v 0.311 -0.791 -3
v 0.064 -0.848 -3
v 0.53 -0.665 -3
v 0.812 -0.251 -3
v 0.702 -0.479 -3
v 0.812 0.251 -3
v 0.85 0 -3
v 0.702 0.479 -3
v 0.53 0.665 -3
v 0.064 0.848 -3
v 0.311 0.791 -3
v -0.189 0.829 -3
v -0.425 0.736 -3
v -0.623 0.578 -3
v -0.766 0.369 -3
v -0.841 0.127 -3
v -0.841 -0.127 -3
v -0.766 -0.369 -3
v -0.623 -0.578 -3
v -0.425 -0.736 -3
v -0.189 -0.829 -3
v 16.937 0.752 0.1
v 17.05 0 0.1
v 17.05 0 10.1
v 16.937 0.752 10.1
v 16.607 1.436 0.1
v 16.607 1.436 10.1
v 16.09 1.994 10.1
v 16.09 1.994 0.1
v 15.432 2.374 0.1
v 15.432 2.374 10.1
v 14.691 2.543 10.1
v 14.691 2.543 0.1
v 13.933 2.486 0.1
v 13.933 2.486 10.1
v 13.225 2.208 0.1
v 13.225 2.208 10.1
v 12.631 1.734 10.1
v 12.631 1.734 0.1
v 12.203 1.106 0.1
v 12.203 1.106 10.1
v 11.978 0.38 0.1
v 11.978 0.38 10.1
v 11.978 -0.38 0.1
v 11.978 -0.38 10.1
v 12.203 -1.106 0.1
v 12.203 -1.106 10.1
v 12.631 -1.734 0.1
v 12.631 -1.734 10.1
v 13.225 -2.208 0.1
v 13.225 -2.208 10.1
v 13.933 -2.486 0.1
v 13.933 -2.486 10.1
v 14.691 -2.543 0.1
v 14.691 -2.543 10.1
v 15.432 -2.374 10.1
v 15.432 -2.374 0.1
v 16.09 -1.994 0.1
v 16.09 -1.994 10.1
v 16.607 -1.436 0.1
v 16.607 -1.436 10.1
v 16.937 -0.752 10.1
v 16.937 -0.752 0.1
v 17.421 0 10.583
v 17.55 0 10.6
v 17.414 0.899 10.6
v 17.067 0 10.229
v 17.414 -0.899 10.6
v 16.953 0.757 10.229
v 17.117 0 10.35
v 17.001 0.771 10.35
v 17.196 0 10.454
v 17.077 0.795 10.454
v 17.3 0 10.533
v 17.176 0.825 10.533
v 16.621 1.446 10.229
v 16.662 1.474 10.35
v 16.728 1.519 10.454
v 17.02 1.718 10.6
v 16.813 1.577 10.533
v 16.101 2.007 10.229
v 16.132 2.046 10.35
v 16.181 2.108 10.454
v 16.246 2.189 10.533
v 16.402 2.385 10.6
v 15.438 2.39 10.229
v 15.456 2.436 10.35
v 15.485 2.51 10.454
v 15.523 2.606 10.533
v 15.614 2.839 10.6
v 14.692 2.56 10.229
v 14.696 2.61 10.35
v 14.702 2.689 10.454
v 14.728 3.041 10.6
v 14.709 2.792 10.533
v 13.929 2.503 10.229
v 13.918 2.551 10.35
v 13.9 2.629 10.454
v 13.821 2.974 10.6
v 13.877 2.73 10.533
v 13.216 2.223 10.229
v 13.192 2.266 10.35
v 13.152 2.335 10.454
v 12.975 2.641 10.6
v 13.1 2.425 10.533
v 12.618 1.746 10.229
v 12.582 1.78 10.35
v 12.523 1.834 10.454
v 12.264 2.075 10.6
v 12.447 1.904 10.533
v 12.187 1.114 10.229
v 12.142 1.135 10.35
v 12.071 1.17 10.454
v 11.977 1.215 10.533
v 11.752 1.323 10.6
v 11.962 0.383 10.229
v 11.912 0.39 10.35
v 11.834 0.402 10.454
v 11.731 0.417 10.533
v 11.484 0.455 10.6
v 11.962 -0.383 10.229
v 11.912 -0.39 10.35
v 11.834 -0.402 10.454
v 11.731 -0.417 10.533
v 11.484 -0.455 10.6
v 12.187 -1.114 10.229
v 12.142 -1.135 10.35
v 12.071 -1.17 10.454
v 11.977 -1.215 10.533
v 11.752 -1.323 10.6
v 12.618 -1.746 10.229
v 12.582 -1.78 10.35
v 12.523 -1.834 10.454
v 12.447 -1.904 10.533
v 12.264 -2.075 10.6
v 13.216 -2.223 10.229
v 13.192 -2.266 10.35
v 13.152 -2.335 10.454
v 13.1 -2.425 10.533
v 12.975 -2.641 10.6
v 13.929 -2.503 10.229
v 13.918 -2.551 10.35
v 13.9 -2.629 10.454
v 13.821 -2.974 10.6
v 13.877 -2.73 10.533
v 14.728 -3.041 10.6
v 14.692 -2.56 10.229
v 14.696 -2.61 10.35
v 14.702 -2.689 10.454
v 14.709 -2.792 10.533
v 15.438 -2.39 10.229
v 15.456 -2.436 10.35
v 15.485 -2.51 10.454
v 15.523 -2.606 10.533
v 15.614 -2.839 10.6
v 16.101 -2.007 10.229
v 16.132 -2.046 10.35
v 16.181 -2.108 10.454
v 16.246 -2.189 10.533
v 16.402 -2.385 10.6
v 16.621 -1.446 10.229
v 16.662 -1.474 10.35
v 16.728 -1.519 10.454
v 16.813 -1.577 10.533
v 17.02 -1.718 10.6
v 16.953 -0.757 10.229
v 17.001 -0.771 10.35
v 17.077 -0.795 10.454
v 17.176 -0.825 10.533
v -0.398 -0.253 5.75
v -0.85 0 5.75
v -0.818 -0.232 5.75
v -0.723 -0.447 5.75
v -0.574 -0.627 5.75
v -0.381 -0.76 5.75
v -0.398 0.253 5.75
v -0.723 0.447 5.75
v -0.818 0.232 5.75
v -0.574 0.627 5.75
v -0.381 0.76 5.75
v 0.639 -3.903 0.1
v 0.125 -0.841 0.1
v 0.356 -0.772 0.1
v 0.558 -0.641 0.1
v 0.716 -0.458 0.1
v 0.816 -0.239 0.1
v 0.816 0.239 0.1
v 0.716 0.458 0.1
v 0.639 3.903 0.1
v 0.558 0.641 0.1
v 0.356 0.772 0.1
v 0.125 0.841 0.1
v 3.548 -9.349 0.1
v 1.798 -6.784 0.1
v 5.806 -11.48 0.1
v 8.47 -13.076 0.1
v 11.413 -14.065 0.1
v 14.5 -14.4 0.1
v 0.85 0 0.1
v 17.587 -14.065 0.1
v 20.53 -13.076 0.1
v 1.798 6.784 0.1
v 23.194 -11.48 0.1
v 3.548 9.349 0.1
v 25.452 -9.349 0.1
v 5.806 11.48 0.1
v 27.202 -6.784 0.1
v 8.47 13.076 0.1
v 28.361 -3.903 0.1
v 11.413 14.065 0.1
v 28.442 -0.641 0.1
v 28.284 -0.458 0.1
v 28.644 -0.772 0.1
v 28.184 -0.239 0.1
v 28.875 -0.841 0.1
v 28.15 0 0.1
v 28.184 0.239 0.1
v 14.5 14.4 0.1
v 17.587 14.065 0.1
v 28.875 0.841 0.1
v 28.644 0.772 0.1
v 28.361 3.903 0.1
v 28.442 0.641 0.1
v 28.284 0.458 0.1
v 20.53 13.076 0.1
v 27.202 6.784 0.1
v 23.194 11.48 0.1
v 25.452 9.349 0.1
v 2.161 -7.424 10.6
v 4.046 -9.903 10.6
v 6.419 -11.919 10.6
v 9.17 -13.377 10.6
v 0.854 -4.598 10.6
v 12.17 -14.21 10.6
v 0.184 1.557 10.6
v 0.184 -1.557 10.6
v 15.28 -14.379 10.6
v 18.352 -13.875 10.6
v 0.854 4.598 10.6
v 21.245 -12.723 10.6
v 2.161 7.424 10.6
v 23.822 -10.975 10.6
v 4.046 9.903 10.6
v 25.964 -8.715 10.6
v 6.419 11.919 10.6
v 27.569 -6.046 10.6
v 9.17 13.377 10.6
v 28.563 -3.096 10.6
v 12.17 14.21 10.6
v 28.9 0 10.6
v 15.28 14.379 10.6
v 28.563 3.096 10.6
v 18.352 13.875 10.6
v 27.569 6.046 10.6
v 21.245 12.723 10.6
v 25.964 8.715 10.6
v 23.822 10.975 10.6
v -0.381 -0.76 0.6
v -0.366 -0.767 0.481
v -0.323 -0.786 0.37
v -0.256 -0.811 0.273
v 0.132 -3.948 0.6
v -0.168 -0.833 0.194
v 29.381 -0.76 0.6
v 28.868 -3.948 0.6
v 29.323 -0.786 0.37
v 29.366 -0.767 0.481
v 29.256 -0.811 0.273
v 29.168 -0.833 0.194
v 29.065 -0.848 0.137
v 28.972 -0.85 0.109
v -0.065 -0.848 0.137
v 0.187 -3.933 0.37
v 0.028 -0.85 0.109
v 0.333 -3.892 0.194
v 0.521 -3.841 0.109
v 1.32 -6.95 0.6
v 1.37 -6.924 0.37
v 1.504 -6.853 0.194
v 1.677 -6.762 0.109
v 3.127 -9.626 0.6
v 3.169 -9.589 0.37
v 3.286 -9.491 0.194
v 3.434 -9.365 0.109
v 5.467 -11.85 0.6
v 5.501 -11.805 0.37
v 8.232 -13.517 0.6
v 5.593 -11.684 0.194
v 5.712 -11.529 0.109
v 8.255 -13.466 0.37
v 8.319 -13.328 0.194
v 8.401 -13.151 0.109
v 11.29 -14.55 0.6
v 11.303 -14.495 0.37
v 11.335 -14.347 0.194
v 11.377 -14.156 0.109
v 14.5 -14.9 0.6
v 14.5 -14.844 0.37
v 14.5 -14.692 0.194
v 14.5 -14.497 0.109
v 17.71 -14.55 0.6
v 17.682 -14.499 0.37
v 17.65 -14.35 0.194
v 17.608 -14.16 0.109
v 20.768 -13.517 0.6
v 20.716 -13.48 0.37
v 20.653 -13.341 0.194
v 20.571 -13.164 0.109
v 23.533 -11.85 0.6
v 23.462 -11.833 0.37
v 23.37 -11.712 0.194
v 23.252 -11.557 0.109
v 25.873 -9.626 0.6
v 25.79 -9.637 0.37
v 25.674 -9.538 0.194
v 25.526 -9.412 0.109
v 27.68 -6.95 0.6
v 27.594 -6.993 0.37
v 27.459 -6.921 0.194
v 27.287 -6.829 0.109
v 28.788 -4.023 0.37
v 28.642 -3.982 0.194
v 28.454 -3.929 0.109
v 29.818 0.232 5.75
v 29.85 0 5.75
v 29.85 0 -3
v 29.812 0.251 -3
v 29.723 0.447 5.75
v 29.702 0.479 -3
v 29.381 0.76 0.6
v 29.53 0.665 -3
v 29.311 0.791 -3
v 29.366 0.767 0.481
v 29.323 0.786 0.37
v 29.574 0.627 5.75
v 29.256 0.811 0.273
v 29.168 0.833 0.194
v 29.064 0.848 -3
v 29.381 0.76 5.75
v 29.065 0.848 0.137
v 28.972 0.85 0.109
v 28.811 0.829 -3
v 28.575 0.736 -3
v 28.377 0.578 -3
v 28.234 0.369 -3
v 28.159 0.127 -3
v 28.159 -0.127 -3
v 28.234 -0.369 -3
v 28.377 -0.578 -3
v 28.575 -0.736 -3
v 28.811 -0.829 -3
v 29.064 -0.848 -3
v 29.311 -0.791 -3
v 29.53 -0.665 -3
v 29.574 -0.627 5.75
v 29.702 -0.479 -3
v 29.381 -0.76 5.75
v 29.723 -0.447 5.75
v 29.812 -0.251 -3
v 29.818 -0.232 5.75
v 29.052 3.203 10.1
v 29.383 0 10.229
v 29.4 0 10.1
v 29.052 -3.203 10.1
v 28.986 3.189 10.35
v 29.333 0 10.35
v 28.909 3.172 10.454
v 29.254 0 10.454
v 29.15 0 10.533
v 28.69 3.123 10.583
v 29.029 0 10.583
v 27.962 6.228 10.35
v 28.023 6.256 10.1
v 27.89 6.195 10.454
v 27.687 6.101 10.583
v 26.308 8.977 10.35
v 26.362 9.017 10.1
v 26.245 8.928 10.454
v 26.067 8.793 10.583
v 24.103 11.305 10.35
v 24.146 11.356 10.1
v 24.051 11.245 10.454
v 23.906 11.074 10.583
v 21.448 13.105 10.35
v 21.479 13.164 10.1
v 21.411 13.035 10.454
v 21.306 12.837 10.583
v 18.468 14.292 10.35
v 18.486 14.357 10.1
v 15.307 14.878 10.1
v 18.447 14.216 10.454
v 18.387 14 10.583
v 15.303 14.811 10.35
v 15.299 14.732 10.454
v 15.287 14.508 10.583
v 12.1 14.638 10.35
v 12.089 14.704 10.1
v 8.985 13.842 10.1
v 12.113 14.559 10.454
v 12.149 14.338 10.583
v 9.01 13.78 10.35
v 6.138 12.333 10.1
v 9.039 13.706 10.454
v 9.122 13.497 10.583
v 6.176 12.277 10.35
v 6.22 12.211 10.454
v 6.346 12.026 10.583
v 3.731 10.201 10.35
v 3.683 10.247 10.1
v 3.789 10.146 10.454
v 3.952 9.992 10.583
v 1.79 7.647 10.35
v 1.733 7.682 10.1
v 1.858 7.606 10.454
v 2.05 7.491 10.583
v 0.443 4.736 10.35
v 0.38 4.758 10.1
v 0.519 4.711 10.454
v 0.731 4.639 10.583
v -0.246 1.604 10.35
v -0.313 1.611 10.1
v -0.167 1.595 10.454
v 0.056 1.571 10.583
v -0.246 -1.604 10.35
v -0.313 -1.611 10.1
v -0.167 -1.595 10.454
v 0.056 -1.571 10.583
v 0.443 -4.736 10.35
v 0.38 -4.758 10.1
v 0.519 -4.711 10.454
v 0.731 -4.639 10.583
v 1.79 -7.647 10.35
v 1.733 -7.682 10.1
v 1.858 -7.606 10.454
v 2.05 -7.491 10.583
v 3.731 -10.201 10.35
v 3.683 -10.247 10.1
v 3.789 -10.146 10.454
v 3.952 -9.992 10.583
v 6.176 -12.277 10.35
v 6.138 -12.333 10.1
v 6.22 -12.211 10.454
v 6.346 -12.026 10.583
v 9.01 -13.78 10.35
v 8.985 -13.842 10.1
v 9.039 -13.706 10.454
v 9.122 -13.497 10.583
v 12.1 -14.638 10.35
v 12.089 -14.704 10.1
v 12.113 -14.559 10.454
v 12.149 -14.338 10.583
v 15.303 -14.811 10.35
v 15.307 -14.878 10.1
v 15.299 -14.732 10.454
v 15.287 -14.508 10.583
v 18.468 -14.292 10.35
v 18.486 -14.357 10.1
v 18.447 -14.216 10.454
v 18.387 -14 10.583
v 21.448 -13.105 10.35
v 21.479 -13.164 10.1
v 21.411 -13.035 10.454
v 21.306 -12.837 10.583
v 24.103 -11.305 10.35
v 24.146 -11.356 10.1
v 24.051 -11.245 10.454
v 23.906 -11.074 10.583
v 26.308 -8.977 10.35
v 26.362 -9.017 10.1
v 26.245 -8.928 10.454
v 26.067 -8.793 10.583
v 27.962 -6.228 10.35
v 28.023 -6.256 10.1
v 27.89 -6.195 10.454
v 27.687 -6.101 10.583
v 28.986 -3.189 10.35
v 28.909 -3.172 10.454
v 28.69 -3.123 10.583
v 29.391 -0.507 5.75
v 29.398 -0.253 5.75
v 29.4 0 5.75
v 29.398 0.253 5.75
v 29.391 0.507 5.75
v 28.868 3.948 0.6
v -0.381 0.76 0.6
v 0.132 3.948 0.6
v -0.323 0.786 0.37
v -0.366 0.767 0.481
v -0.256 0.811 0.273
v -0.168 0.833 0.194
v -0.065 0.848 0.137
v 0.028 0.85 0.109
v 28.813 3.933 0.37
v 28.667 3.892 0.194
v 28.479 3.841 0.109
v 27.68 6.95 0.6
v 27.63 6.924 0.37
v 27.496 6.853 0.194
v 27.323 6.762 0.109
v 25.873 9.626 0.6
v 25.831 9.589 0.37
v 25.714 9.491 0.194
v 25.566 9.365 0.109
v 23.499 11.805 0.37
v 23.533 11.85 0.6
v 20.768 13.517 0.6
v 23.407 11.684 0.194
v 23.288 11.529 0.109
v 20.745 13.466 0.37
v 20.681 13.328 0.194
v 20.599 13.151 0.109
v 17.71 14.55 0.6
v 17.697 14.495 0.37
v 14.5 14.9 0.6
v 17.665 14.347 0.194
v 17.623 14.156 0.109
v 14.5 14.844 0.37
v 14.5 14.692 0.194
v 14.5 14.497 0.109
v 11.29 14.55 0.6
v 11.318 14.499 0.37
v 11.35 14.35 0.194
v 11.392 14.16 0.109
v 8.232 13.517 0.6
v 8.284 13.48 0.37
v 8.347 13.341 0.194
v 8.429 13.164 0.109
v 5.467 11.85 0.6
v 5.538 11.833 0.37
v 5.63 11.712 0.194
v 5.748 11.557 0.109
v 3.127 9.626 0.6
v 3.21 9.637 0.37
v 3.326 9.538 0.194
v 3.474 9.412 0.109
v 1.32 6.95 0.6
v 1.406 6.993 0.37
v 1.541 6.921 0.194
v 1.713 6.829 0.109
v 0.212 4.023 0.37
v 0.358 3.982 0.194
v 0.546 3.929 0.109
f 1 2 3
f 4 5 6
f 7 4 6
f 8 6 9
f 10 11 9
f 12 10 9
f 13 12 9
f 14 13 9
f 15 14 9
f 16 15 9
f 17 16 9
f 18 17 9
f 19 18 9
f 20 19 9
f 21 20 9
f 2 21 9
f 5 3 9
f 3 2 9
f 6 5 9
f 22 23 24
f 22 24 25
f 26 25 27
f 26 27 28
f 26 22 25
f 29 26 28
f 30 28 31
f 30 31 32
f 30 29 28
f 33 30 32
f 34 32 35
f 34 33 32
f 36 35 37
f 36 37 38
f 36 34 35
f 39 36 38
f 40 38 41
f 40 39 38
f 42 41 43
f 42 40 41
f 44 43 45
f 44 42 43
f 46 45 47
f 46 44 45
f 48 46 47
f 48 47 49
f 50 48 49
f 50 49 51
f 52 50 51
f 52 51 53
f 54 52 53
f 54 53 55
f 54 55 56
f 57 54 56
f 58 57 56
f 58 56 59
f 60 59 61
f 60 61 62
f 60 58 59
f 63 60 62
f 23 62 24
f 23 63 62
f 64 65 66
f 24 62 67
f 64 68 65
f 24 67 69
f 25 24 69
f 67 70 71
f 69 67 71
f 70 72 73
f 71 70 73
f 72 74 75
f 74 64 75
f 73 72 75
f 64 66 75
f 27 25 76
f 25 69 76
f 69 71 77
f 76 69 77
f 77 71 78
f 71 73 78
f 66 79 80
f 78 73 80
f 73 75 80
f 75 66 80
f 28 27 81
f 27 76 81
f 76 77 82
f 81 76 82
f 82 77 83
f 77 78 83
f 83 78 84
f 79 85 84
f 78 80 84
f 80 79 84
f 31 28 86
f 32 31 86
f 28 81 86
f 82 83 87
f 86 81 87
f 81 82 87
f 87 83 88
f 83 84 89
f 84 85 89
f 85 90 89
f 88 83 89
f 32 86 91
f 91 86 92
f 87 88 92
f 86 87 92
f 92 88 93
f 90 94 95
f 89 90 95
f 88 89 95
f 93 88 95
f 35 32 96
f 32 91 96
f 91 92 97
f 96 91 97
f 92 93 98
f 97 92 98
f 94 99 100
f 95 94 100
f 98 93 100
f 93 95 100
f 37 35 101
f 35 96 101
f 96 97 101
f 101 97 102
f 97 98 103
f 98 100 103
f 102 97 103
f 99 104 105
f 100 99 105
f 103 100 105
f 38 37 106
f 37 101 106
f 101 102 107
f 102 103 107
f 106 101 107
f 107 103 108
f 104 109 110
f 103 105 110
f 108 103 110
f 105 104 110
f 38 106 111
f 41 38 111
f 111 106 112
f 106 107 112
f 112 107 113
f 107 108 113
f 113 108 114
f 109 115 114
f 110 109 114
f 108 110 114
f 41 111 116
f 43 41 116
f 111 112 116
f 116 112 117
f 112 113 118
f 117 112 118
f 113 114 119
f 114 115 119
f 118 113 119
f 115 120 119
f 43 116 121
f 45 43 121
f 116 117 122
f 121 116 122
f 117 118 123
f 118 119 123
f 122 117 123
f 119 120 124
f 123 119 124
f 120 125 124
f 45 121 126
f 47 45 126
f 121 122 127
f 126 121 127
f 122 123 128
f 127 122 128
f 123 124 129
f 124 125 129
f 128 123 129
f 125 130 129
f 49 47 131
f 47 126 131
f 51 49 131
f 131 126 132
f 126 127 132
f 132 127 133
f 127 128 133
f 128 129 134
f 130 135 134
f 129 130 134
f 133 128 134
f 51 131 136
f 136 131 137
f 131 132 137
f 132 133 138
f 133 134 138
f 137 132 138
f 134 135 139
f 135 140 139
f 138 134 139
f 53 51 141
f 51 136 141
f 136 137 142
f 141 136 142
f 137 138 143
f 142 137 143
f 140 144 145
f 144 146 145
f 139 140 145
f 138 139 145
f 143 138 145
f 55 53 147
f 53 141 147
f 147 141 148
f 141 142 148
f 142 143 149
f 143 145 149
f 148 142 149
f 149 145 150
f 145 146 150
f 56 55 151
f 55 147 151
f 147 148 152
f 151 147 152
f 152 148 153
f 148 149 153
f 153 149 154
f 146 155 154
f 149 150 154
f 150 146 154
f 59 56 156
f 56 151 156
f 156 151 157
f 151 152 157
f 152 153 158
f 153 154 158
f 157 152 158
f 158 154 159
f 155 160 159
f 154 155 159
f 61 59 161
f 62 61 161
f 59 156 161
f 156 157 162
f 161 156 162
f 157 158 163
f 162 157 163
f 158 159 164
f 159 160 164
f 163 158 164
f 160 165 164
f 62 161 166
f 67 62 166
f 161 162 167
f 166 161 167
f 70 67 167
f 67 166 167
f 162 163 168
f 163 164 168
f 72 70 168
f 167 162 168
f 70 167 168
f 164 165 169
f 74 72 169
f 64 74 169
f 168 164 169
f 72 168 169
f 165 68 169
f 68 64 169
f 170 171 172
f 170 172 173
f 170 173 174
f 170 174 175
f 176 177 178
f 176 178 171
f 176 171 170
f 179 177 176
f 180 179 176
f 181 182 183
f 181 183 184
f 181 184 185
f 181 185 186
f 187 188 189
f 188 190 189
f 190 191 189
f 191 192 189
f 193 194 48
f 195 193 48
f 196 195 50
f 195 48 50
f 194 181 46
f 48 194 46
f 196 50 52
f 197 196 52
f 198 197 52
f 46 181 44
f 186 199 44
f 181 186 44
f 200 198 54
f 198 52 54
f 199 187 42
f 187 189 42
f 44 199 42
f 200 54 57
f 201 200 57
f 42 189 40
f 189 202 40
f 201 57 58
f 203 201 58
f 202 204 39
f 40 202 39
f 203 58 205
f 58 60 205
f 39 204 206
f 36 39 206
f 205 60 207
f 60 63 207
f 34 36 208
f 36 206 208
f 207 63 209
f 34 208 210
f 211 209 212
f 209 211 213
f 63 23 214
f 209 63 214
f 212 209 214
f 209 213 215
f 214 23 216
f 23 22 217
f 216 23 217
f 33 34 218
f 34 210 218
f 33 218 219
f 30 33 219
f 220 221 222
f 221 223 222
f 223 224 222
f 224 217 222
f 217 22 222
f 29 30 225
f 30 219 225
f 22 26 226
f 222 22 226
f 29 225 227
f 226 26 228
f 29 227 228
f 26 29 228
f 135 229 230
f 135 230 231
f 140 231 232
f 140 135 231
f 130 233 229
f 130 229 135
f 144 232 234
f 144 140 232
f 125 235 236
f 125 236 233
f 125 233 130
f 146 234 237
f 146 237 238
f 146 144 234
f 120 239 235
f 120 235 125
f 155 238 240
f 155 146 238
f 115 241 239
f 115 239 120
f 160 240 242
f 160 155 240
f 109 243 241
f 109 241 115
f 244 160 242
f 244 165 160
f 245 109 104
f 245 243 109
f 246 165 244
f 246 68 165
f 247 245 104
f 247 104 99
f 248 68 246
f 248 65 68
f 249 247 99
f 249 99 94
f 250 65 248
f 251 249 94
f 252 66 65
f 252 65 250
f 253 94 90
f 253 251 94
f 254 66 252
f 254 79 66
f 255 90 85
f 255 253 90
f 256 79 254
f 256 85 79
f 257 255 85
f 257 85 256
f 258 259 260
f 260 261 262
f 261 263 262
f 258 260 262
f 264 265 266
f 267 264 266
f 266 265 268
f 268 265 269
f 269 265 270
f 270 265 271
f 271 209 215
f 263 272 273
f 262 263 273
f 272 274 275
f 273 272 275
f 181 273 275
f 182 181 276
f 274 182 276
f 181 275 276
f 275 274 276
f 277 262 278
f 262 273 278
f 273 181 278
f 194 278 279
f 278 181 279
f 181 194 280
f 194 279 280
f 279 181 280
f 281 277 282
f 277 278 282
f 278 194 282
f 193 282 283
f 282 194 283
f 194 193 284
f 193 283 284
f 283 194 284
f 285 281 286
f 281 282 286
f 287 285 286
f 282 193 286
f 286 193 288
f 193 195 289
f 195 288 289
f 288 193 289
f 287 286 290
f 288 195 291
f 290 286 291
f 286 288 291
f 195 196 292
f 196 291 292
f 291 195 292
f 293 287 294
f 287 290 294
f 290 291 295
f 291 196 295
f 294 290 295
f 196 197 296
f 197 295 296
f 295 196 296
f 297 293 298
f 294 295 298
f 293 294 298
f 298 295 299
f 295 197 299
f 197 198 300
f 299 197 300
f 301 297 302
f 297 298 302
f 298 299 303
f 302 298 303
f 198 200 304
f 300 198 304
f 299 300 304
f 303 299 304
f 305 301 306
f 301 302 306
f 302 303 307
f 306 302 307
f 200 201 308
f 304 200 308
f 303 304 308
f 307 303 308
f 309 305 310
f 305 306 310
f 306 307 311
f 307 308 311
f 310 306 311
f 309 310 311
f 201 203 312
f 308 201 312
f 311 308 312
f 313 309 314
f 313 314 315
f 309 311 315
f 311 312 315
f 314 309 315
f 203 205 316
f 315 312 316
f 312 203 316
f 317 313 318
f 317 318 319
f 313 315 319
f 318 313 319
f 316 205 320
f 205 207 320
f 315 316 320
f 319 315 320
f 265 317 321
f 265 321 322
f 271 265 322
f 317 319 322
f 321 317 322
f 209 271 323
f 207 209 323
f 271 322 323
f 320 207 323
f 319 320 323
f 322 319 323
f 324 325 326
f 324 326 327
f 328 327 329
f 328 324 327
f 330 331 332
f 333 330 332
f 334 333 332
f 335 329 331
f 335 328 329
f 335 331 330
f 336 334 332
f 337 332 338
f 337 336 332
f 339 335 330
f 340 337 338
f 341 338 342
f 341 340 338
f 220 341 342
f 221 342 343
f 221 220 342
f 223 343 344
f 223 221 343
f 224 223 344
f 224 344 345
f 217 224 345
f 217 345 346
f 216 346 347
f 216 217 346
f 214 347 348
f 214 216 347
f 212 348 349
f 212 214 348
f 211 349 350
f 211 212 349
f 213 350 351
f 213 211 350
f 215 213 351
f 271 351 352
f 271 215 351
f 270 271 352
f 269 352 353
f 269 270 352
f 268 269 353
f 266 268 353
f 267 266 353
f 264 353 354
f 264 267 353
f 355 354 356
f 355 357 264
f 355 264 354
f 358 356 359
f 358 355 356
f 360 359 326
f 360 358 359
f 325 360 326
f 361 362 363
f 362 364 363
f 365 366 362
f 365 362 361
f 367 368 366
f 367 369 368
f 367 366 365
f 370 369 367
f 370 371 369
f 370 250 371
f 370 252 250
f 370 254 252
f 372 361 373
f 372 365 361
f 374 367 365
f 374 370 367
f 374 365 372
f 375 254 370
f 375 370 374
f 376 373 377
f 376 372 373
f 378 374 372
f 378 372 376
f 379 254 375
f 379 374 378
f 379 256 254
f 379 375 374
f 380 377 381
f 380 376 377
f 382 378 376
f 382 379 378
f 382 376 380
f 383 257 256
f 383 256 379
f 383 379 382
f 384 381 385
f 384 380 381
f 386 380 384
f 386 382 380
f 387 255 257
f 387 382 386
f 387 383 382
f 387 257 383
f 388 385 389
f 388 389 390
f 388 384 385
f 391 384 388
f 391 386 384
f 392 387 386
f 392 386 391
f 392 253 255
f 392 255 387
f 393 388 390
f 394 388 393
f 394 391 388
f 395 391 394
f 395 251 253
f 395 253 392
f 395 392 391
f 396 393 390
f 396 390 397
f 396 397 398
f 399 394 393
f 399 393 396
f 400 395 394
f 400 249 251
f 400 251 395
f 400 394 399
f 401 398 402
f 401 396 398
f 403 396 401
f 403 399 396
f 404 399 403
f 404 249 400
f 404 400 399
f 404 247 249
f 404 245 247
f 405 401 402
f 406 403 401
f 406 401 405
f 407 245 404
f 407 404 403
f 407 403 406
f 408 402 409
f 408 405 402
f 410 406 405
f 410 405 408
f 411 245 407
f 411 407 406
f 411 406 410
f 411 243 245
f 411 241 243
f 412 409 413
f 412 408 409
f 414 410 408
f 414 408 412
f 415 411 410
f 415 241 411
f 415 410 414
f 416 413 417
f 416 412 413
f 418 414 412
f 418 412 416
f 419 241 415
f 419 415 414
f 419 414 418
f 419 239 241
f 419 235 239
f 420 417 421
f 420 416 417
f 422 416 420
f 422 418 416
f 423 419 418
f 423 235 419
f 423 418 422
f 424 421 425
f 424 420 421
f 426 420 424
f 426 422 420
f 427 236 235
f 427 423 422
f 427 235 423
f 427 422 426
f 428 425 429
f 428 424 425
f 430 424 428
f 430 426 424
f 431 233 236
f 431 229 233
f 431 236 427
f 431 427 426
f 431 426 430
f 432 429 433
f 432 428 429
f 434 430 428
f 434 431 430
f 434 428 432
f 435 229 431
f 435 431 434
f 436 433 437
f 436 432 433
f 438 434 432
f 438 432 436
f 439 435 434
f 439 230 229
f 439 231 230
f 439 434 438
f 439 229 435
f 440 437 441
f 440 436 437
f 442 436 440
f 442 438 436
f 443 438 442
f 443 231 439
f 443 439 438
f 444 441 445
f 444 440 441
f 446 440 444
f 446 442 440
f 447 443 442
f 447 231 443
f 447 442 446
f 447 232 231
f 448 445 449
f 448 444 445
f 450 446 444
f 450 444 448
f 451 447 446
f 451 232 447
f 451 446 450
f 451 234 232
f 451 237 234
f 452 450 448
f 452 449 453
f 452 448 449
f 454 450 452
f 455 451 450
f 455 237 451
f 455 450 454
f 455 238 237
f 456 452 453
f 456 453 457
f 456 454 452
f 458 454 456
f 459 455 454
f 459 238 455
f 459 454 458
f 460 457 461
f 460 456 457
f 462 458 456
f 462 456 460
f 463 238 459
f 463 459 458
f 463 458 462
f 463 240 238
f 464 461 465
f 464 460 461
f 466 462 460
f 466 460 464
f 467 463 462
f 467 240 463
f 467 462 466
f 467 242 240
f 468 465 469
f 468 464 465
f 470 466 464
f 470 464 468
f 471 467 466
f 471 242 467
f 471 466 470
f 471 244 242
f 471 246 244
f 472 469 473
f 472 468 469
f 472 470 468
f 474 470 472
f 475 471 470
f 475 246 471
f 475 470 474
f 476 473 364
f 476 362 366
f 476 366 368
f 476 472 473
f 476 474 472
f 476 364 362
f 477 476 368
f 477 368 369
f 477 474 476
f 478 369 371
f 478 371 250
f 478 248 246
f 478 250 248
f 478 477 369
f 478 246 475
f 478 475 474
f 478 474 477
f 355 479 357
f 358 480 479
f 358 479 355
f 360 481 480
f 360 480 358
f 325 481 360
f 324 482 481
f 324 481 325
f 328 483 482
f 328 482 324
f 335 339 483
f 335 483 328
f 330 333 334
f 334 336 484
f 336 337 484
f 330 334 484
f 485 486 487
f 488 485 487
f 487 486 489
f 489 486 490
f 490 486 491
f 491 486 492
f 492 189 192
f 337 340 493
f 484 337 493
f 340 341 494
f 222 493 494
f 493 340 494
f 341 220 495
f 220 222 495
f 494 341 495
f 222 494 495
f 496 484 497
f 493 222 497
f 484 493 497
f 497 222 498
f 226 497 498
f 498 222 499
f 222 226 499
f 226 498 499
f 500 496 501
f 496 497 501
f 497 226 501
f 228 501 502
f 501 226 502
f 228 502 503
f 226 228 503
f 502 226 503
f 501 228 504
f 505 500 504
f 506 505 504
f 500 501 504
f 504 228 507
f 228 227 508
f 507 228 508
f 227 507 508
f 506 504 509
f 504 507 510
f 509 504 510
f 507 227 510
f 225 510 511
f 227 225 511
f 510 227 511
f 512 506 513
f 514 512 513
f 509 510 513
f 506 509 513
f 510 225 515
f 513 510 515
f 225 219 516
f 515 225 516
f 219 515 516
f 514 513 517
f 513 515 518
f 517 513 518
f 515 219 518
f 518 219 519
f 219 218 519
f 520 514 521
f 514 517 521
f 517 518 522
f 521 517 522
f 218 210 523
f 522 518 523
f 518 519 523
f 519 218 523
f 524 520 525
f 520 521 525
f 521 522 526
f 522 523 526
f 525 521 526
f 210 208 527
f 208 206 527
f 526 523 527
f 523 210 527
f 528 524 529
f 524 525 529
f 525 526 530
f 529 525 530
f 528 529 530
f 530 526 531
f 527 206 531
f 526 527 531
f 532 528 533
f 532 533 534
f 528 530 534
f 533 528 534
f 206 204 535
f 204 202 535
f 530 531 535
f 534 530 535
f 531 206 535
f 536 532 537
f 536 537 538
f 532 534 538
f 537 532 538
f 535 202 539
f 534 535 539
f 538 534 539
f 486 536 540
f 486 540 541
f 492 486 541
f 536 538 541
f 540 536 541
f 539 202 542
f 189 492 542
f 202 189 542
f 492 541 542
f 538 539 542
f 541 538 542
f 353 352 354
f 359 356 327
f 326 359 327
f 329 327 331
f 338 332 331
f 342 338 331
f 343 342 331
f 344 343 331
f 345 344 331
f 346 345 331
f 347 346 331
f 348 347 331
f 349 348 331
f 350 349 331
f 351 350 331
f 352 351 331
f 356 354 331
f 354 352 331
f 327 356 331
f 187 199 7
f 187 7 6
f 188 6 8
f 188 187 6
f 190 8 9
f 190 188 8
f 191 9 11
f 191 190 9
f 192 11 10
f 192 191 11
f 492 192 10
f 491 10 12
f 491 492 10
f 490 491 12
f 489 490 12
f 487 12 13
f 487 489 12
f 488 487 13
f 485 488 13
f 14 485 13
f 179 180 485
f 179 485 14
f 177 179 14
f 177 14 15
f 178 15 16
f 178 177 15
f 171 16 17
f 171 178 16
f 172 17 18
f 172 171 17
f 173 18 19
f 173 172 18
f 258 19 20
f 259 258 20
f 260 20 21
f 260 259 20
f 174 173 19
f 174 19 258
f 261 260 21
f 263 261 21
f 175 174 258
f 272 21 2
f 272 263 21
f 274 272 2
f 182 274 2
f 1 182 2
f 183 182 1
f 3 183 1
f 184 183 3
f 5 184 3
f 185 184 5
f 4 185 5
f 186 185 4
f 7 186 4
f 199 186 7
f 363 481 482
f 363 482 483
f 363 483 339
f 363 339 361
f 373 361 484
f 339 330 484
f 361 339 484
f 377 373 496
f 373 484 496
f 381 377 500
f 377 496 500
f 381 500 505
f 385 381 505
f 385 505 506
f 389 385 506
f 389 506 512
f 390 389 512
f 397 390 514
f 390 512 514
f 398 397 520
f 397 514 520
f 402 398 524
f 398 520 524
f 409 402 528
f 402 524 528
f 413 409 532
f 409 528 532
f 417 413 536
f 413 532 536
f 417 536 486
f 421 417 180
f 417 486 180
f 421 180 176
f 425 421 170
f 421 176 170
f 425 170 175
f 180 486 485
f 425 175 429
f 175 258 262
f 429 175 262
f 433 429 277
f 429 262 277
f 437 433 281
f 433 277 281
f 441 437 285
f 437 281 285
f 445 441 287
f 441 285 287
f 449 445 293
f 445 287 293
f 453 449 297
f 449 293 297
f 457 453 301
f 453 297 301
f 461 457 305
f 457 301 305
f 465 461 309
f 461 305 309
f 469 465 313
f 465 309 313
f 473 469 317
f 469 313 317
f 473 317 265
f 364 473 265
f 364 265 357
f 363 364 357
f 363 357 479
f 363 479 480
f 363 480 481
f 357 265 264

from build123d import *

# Parameters (mm, degrees)
SKETCH_R          = 14.9
SKETCH_R_2        = 2.55
PAD_DEPTH         = 10.5
FILLET_R          = 0.5
SKETCH001_R       = 0.85
PAD001_DEPTH      = 5.25
PAD001_DEPTH_BACK = 3.5


with BuildPart() as fillet_body:
    # Sketch → Pad (new body)
    with BuildSketch(Plane.XY.offset(0.1)):
        with Locations((14.5, 0)):
            Circle(SKETCH_R)
        with Locations((14.5, 0)):
            Circle(SKETCH_R_2, mode=Mode.SUBTRACT)
    extrude(amount=PAD_DEPTH)

    # Fillet
    fillet_edges = [fillet_body.edges().sort_by_distance(p)[0] for p in [
        (11.95, 0, 10.6),
        (-0.4, 0, 10.6),
        (-0.4, 0, 0.1),
    ]]
    fillet(fillet_edges, radius=FILLET_R)


with BuildPart() as pad001_mp_cp:
    # Sketch001 → Pad001 (new body, two sides)
    with BuildSketch(Plane.XY.offset(0.5)) as pad001_sk:
        Circle(SKETCH001_R)
        with Locations((29, 0)):
            Circle(SKETCH001_R)
    extrude(amount=PAD001_DEPTH)
    extrude(pad001_sk.sketch, amount=-PAD001_DEPTH_BACK)

    # Pad001_mp_cp: union Fillet body
    add(fillet_body.part)


solid = pad001_mp_cp.part
